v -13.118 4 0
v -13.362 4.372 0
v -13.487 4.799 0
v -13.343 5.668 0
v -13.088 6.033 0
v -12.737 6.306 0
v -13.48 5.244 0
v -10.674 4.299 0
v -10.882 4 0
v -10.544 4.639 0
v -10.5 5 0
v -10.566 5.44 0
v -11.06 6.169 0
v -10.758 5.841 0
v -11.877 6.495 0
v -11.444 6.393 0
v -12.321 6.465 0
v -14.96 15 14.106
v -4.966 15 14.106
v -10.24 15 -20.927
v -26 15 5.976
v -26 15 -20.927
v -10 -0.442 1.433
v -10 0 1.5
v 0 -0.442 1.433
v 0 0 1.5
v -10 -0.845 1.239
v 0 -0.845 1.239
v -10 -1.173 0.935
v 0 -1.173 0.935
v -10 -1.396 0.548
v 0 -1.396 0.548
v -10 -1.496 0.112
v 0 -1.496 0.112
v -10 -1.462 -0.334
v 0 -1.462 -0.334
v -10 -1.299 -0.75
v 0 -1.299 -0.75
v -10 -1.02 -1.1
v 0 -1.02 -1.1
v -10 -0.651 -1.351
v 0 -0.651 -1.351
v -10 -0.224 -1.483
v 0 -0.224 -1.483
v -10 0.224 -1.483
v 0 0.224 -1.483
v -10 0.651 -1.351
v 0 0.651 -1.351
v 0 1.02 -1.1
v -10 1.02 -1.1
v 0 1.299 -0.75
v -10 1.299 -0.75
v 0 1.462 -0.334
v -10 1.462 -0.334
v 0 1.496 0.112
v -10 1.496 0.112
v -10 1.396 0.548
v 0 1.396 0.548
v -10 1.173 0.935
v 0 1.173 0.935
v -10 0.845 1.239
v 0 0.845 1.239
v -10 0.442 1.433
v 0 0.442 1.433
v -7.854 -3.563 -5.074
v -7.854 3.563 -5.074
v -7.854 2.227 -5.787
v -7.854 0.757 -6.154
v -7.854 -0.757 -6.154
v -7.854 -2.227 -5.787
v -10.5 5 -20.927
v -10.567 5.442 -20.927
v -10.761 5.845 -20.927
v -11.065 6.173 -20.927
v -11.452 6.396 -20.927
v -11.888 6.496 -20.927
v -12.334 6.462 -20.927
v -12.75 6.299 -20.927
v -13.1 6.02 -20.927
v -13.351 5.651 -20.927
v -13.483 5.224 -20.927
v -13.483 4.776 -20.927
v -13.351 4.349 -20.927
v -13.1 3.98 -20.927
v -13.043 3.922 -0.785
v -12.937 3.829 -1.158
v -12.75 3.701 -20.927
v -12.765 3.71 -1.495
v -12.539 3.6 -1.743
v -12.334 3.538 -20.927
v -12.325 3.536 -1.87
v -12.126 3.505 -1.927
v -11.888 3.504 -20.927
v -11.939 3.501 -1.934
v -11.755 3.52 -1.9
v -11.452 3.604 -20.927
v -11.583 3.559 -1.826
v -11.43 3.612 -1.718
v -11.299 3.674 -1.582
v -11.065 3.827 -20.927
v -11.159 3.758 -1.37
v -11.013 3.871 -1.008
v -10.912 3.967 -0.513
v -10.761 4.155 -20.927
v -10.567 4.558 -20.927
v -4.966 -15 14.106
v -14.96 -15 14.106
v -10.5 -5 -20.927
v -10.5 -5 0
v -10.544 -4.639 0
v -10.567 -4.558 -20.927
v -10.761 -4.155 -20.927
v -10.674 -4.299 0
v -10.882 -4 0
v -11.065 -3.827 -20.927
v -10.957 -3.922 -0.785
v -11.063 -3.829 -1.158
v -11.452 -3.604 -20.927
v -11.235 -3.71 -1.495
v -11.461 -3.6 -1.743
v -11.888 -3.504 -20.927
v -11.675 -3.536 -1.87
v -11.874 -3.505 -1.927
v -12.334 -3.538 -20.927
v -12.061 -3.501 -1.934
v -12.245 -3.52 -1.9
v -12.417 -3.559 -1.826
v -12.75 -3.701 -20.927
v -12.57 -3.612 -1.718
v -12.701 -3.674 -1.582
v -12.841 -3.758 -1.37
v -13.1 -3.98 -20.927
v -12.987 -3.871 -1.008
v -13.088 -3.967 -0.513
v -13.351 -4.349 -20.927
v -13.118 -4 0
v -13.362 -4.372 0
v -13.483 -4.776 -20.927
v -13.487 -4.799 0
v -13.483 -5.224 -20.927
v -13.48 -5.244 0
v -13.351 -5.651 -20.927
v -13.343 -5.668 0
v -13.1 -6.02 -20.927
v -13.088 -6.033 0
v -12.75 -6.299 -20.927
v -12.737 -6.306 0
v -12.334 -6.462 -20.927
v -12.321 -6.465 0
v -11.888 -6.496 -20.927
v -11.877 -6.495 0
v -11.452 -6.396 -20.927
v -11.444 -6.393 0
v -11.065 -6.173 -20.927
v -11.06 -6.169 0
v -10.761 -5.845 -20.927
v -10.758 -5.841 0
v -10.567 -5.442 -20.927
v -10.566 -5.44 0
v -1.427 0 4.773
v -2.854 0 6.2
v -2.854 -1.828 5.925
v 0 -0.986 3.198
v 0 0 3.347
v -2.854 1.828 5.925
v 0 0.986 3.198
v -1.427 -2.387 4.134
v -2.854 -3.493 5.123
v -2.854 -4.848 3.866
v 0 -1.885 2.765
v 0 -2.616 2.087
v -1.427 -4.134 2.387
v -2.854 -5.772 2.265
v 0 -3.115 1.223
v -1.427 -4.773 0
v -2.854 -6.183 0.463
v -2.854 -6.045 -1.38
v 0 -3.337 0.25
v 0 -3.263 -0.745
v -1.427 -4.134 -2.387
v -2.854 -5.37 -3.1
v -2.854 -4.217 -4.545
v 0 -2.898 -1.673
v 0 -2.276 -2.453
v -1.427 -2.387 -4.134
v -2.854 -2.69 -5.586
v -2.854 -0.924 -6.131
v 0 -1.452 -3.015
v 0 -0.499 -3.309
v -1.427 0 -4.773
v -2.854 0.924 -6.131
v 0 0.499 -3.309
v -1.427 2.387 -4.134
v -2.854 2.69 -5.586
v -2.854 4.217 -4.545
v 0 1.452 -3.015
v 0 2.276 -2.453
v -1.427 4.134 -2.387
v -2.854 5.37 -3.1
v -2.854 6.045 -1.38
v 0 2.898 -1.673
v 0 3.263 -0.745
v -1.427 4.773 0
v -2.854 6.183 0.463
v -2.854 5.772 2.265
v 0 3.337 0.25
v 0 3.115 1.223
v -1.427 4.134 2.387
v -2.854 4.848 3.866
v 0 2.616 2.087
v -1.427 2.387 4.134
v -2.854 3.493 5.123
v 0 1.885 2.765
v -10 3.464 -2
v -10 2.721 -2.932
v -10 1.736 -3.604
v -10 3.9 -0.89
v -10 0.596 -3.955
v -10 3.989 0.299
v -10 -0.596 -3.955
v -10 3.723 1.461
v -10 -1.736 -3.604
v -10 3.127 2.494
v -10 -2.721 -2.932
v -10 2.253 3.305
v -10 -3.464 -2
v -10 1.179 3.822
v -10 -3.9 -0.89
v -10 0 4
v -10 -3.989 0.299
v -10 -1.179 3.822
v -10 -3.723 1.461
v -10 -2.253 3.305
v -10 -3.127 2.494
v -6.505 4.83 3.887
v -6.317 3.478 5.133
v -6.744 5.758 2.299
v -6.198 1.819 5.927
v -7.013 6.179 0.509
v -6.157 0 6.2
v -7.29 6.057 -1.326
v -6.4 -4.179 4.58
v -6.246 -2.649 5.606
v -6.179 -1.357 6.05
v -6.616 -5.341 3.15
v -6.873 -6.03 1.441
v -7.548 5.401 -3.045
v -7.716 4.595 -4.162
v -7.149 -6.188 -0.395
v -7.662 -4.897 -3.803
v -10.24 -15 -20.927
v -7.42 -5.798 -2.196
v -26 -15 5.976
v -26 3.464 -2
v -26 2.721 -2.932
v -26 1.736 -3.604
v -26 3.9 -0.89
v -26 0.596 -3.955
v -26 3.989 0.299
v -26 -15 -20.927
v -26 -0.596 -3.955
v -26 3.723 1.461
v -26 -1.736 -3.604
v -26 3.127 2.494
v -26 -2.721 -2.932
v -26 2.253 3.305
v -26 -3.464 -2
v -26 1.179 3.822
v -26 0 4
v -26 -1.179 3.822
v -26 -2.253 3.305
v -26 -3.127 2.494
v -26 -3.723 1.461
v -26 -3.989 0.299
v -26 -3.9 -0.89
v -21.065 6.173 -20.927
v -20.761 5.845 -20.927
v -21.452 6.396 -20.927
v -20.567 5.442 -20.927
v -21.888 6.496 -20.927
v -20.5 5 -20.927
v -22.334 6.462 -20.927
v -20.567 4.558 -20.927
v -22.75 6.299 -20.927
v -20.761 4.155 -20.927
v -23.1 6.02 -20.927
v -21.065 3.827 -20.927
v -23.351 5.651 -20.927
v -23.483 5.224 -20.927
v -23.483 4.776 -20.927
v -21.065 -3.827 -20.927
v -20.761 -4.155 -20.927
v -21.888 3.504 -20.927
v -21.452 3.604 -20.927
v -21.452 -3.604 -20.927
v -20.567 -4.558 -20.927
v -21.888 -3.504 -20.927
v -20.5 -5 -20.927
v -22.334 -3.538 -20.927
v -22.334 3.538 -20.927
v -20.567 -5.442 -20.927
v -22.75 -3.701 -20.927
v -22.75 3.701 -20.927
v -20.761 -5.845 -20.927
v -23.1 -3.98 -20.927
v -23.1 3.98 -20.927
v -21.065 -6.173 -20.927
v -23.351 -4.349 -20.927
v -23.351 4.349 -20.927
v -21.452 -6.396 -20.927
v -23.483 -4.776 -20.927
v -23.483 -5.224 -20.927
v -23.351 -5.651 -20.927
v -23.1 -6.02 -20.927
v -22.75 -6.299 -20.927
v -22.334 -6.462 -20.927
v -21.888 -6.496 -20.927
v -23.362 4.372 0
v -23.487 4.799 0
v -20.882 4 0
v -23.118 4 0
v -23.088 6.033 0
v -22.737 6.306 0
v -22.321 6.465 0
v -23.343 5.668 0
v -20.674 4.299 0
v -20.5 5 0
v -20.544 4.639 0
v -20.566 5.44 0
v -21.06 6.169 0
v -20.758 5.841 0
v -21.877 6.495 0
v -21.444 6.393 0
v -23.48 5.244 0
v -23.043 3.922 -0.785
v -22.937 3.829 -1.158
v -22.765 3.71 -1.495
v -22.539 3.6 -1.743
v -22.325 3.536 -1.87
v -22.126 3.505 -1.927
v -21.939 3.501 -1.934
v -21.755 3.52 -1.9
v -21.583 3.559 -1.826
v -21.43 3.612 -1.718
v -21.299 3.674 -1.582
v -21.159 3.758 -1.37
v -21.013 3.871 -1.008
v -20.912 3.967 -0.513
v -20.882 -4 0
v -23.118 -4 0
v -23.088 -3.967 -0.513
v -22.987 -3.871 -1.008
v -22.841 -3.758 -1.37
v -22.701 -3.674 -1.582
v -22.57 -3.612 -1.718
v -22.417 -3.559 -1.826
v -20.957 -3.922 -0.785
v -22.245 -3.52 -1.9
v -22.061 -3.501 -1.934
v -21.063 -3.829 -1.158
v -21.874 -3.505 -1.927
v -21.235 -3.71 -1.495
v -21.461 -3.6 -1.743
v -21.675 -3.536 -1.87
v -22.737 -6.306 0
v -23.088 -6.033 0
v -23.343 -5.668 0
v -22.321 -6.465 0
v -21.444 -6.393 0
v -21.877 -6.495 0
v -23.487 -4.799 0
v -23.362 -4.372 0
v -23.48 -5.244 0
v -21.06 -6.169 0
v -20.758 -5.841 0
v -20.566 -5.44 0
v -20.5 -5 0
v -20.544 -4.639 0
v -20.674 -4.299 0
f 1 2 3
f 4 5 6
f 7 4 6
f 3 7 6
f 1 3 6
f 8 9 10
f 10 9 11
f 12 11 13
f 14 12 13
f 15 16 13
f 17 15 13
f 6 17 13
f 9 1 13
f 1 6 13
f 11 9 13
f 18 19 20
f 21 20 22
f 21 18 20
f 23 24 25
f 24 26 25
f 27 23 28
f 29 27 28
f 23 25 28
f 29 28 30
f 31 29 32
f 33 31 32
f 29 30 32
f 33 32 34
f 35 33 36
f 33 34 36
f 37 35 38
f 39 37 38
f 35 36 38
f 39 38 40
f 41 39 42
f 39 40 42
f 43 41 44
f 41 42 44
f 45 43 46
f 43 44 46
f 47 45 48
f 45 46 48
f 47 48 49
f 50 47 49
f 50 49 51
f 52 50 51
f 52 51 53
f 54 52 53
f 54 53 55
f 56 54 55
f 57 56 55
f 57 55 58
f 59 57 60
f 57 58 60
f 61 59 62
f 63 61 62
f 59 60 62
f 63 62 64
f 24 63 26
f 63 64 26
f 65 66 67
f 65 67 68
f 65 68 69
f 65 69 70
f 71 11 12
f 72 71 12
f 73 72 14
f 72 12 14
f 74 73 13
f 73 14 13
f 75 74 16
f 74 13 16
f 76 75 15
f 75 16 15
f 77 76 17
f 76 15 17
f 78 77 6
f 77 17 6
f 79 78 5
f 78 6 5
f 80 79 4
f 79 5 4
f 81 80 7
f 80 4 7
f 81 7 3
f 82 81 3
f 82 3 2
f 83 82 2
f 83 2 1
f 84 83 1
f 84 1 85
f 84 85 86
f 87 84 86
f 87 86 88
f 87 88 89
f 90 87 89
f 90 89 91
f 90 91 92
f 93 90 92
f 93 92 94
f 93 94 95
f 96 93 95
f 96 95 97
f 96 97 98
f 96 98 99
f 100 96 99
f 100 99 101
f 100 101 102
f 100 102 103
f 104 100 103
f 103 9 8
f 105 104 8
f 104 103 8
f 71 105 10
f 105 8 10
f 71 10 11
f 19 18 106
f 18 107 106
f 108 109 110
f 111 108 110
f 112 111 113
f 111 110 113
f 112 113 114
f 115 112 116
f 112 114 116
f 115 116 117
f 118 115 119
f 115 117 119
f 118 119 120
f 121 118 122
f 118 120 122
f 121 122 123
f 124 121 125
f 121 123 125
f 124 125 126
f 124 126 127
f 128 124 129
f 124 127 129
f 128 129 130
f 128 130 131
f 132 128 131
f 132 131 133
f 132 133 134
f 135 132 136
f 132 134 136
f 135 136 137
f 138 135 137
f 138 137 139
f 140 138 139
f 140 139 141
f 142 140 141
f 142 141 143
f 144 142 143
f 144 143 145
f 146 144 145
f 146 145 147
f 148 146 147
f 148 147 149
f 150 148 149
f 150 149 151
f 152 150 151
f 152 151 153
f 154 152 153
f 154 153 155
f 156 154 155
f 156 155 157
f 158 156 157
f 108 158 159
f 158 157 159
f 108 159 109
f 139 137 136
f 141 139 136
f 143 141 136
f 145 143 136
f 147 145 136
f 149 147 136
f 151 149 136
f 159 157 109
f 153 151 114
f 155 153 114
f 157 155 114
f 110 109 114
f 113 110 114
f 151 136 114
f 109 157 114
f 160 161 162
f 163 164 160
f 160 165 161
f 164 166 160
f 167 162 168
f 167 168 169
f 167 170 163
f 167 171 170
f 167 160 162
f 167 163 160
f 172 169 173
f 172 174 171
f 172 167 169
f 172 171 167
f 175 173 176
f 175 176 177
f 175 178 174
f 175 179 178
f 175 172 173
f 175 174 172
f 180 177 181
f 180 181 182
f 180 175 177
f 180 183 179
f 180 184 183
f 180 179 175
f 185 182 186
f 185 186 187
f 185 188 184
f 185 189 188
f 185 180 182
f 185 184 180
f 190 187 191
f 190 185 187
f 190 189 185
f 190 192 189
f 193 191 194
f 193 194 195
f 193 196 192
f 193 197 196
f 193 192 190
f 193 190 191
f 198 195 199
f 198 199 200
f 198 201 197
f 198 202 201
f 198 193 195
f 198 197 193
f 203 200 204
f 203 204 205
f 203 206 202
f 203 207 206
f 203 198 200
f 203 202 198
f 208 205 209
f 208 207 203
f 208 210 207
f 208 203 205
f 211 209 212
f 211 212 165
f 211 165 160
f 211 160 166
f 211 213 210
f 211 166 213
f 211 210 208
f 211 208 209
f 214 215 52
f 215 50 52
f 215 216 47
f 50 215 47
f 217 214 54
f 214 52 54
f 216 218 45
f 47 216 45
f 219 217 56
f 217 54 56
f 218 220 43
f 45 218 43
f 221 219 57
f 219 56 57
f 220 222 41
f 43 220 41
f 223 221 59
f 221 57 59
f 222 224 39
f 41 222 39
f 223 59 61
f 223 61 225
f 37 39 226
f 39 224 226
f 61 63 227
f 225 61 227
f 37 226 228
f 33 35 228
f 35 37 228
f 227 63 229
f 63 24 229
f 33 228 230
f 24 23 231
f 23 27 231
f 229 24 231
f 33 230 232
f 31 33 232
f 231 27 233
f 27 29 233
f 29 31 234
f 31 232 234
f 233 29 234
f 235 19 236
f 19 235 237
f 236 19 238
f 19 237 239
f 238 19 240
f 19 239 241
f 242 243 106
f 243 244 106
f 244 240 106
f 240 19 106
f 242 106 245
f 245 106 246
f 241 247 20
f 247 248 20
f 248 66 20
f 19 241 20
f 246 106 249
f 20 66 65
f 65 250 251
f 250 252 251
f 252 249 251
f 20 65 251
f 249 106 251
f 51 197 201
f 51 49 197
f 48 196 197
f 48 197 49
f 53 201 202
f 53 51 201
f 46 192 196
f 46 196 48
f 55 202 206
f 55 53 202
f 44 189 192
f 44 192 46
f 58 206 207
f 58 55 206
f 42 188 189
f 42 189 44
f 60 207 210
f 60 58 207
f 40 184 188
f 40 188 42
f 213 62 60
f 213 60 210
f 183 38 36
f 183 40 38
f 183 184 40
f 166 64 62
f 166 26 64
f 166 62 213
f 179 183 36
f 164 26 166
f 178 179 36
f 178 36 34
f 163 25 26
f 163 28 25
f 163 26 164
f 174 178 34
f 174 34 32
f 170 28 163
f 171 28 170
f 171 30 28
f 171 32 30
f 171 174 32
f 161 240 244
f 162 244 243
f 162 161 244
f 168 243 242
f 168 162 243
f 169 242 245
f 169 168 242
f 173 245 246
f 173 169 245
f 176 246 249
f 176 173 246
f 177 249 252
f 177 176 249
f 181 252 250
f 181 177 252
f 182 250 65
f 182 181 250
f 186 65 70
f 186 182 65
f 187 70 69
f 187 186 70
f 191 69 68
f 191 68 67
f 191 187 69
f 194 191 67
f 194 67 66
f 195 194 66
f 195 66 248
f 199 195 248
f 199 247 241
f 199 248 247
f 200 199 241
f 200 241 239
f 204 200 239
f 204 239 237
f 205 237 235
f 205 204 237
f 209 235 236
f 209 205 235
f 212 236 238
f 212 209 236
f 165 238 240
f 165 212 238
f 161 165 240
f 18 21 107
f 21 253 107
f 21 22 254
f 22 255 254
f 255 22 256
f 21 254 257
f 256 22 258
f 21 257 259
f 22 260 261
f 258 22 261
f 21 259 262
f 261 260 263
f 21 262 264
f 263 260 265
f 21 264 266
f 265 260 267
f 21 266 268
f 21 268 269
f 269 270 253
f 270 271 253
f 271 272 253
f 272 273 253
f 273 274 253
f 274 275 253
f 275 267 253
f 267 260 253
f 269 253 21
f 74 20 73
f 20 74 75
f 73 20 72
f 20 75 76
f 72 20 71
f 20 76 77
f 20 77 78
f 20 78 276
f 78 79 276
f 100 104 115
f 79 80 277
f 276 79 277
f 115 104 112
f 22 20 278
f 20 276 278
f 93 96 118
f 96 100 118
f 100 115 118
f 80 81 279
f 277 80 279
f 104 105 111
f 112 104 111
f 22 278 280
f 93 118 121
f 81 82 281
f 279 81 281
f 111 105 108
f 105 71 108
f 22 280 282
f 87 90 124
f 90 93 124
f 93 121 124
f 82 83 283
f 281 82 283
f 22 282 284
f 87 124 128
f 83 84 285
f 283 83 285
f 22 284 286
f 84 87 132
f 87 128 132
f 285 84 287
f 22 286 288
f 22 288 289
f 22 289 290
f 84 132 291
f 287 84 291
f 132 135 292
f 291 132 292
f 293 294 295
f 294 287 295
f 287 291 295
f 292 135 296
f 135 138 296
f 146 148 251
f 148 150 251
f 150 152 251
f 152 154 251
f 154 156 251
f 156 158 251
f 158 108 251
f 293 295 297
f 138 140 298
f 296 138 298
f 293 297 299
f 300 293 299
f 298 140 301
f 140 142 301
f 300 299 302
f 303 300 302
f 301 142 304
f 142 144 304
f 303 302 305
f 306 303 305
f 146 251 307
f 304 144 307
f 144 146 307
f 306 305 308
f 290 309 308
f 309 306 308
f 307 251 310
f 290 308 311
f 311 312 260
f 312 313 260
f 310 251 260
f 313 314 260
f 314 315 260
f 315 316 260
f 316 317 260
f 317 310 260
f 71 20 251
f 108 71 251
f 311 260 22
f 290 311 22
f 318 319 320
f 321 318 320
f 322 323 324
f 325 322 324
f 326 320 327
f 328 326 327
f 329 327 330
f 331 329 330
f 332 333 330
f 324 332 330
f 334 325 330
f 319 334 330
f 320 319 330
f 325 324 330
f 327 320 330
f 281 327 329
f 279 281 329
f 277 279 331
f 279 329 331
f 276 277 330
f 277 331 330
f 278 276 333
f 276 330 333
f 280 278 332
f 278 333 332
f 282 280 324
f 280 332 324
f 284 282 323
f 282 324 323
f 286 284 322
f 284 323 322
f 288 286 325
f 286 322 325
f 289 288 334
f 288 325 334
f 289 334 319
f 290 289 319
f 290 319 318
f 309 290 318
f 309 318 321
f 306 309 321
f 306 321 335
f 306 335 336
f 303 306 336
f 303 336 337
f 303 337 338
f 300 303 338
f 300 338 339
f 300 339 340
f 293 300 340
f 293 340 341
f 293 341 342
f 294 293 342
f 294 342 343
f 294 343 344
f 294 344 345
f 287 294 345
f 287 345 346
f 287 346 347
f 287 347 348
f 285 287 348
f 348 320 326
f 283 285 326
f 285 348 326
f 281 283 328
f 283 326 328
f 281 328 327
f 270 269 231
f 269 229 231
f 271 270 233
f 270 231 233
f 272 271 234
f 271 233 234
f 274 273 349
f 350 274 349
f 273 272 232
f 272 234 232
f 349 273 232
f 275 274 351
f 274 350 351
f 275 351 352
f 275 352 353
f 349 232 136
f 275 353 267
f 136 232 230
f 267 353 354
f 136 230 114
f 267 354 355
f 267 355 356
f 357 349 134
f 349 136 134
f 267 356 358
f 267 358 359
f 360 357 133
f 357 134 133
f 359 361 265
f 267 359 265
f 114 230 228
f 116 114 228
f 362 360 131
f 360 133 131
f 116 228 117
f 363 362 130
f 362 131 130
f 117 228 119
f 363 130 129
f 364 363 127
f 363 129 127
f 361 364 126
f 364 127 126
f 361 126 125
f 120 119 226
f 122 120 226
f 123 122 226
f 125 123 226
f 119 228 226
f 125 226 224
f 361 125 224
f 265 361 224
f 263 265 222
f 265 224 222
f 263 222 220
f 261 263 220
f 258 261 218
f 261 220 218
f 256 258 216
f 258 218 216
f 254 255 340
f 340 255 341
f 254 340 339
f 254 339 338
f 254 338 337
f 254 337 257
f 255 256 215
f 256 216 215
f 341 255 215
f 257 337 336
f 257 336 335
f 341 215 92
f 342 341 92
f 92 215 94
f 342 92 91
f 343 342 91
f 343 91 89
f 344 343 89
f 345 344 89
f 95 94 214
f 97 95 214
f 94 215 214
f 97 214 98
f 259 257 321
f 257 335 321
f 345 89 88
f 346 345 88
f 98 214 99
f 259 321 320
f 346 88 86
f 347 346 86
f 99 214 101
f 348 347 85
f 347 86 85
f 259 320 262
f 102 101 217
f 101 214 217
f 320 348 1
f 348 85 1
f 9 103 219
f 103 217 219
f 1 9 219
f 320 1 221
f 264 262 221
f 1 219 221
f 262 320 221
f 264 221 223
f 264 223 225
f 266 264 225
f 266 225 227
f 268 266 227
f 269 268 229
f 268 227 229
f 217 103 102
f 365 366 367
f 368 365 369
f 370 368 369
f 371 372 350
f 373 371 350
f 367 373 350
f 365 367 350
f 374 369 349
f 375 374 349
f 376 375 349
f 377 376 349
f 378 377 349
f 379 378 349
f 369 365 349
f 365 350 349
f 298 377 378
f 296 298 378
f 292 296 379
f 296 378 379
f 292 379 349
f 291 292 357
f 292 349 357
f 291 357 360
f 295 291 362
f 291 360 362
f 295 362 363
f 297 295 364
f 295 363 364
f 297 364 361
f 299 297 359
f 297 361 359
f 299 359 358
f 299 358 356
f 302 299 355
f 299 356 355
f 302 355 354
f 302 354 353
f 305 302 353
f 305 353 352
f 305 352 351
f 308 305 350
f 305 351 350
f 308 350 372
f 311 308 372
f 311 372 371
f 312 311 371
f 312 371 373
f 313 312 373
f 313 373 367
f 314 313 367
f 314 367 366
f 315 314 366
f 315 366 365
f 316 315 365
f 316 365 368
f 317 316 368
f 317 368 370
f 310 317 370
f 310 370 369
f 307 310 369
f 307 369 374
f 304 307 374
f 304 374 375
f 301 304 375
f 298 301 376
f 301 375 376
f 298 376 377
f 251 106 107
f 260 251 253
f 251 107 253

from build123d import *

# Parameters (mm, degrees)
SKETCH003_R  = 1.5
PAD_DEPTH    = 50
PAD001_DEPTH = 15


with BuildPart() as bearingmountcutout:
    # Sketch007 → Revolution003 (revolve)
    with BuildSketch(Plane.XZ):
        Polygon((-35, 0), (-35, 4), (-10, 4), (-10, 1.5), (0, 1.5), (0, 0), align=None)
    revolve(axis=Axis((0, 0, 0), (1, 0, 0)))


with BuildPart() as cutouts:
    # Sketch003 → Pad (new body)
    with BuildSketch(Plane.XY):
        with Locations((-22, 5)):
            Circle(SKETCH003_R)
        with Locations((-12, 5)):
            Circle(SKETCH003_R)
        with Locations((-22, -5)):
            Circle(SKETCH003_R)
        with Locations((-12, -5)):
            Circle(SKETCH003_R)
    extrude(amount=-PAD_DEPTH)

    # Fusion001: union BearingMountCutout
    add(bearingmountcutout.part)


with BuildPart() as innerrace002:
    # Sketch001 → Revolution001 (revolve)
    with BuildSketch(Plane.XZ):
        Polygon((-7.853732, 6.200251), (-2.853732, 6.200251), (0, 3.346519), (0, 0), (-7.853732, 0), align=None)
    revolve(axis=Axis((0, 0, 0), (1, 0, 0)))


with BuildPart() as base001:
    # Sketch004 → Pad001 (new body, symmetric)
    with BuildSketch(Plane.XZ):
        Polygon((-26, -20.927391), (-26, 5.975582), (-14.9603, 14.10621), (-4.966401, 14.10621), (-10.240184, -20.927391), align=None)
    extrude(amount=PAD001_DEPTH, both=True)

    # Fusion: union InnerRace002
    add(innerrace002.part)

    # Cut001: cut Cutouts
    add(cutouts.part, mode=Mode.SUBTRACT)


solid = base001.part
